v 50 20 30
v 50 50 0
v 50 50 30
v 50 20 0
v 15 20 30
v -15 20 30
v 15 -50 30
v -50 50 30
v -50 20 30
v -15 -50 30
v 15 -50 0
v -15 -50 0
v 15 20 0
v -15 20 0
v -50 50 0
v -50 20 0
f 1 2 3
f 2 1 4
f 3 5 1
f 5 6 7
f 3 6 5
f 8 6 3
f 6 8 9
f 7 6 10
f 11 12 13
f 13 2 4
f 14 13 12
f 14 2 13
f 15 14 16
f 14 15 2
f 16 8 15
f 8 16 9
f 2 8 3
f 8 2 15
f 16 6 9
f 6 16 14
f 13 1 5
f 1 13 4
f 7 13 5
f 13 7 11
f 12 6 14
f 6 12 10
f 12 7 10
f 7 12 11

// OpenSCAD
// pushT-so100 canonical T-block - training data truth
// Full dims: top 100x30x30, stem 30x70x30, height 30mm
// MuJoCo half-sizes: 0.05 0.015 0.015 / 0.015 0.035 0.015
union(){
  translate([0, 35, 15]) cube([100, 30, 30], center=true);
  translate([0, -15, 15]) cube([30, 70, 30], center=true);
}
